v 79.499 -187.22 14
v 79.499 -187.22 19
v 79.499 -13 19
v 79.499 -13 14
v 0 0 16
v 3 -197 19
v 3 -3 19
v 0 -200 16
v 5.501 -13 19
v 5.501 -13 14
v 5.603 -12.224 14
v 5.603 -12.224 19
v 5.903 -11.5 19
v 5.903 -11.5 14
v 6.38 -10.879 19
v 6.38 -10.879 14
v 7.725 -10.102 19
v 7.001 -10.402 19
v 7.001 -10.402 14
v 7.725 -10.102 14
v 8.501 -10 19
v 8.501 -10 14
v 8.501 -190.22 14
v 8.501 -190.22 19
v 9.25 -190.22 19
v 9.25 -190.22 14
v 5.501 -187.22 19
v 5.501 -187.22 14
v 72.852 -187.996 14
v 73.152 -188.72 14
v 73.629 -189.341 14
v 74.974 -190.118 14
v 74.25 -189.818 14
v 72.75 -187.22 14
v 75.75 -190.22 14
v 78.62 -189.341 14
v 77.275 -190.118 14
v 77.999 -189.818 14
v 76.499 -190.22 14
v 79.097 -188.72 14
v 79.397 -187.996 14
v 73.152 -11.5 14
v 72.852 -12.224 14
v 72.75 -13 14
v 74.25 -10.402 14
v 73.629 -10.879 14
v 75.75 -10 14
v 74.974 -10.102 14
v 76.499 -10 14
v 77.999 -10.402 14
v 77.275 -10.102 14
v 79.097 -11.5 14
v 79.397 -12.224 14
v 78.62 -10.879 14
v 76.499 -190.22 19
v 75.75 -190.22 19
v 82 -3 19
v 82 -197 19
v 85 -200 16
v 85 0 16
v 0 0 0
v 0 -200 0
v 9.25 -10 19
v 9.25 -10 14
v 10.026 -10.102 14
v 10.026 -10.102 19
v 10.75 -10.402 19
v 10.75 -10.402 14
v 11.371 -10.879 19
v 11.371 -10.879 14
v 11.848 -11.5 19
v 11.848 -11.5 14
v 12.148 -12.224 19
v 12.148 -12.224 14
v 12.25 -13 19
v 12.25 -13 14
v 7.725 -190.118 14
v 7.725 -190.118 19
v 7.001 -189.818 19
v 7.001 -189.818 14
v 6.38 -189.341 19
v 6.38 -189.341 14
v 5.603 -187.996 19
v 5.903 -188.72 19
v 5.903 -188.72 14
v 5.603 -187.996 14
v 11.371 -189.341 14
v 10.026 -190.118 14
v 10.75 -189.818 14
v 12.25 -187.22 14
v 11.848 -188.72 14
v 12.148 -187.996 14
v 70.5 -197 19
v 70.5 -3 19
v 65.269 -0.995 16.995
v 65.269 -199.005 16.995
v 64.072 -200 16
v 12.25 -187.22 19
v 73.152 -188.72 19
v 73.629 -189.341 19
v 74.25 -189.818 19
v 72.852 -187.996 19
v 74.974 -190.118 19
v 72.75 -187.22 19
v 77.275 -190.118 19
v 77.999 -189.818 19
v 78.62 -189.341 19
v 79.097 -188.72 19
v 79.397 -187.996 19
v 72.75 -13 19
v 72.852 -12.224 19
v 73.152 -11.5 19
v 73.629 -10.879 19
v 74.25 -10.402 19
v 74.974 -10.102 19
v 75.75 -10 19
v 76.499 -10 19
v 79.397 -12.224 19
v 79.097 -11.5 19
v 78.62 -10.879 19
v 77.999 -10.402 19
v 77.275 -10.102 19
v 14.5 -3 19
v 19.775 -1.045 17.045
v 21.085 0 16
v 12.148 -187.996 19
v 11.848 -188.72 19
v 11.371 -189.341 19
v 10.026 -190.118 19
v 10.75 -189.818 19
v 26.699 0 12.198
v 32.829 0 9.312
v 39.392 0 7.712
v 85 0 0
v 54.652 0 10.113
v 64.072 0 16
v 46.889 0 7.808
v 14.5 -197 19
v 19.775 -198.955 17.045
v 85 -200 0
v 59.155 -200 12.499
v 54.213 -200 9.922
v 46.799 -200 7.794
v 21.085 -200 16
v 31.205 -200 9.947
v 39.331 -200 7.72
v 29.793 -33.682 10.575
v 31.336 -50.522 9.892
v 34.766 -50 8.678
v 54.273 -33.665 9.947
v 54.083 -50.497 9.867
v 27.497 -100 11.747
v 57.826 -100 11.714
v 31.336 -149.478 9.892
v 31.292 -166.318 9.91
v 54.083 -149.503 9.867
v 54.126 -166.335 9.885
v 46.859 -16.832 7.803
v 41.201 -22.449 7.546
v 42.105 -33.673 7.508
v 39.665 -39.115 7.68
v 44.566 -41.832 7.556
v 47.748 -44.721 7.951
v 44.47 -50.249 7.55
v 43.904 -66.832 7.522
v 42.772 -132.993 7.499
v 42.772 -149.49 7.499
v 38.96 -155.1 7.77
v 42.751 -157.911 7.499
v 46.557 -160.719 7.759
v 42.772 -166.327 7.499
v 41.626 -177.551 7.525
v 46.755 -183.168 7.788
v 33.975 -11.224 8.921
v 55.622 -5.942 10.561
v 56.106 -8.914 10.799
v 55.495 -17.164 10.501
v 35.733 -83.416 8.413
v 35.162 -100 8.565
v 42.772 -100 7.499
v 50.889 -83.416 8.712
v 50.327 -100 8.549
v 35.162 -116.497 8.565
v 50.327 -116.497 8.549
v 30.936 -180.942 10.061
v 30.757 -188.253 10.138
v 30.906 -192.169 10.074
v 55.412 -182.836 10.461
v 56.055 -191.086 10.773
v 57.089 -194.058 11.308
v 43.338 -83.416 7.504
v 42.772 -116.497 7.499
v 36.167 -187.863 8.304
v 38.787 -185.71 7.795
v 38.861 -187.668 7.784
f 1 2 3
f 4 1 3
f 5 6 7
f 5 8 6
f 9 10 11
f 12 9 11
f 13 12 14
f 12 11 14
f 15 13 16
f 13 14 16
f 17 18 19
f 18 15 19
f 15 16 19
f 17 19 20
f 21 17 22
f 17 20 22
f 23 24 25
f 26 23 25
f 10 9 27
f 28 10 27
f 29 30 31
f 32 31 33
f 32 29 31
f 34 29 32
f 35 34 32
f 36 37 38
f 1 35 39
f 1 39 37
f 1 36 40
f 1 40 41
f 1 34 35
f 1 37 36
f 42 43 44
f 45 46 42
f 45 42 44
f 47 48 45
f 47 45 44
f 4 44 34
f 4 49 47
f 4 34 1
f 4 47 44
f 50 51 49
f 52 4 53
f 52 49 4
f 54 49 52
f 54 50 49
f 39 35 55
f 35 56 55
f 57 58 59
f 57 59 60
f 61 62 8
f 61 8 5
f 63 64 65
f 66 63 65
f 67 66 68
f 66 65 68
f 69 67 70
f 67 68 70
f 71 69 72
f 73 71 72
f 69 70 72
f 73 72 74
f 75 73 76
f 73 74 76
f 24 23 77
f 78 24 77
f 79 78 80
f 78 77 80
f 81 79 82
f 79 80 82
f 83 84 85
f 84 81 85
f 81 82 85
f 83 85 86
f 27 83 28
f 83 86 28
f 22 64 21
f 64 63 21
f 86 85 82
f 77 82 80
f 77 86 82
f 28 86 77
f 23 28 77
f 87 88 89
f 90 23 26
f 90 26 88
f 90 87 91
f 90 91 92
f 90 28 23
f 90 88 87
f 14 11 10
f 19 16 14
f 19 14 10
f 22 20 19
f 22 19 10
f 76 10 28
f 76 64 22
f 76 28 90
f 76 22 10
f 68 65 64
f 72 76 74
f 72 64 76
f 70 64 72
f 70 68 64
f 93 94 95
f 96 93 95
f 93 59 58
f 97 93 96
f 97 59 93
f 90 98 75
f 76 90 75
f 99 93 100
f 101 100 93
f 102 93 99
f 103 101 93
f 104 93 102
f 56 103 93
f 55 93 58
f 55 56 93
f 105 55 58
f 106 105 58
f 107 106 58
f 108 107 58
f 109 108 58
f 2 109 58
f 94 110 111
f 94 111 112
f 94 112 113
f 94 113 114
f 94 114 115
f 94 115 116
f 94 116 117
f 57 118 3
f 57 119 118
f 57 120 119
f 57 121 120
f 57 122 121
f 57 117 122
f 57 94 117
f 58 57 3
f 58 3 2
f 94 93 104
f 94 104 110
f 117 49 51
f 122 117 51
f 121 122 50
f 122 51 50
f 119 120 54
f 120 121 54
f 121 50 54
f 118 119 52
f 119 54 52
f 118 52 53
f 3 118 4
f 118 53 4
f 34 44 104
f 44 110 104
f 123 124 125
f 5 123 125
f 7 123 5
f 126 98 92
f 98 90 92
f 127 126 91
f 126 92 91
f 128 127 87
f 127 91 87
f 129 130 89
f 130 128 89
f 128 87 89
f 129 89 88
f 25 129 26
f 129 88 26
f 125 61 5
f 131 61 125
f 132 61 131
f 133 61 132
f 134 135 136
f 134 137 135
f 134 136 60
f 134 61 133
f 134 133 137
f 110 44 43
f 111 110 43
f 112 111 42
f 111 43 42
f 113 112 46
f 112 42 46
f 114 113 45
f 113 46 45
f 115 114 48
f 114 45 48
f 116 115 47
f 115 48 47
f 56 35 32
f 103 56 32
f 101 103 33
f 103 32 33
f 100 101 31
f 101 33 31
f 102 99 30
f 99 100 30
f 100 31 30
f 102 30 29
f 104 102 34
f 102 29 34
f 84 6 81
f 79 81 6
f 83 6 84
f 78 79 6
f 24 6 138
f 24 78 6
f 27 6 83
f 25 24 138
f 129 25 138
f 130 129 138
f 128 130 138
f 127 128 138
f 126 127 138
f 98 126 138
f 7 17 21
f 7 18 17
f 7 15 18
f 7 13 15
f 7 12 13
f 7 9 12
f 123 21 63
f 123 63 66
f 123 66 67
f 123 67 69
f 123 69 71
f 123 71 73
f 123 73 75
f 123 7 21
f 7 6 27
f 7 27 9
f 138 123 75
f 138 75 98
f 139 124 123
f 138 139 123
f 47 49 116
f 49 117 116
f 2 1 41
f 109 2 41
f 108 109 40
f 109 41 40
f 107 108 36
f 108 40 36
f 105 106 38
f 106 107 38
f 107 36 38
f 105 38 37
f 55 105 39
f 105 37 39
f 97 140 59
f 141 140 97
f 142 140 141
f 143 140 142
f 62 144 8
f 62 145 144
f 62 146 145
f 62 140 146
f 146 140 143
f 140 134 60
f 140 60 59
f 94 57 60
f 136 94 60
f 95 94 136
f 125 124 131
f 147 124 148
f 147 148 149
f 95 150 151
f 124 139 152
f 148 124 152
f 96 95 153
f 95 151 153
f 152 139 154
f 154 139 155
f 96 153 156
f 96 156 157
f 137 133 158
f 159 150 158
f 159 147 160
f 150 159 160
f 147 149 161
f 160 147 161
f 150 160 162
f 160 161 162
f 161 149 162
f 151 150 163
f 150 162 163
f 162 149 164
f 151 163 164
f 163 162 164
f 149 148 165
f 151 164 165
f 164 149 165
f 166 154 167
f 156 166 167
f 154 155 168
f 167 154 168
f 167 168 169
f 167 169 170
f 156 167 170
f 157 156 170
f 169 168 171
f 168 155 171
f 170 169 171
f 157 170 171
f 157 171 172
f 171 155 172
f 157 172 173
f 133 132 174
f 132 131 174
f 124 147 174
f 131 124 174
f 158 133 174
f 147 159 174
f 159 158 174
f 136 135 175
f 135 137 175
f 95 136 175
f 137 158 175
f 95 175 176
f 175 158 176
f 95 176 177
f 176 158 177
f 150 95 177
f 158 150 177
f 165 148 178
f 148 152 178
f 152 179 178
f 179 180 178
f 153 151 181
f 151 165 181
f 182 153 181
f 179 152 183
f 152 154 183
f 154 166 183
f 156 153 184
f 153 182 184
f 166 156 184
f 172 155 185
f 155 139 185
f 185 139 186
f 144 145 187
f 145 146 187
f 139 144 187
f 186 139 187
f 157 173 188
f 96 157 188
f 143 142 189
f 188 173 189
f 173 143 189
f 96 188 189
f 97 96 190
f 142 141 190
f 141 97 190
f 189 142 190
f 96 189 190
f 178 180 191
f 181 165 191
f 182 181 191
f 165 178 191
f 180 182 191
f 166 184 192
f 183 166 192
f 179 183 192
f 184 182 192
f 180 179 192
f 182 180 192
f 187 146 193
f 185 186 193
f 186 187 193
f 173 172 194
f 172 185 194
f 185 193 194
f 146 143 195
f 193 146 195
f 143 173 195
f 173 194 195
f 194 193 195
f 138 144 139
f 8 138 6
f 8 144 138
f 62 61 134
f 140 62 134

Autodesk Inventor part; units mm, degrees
ref_plane "YZ Plane" through (0, 0, 0) normal (1, 0, 0) x (0, 1, 0)
ref_plane "XZ Plane" through (0, 0, 0) normal (0, 1, 0) x (-1, 0, 0)
ref_plane "XY Plane" through (0, 0, 0) normal (0, 0, 1) x (1, 0, 0)
sketch "Sketch2" plane through (0, 0, 0) normal (0, 0, 1) x (1, 0, 0)
  line L0 (0, 0) -> (85, 0)
  line L1 (85, 0) -> (85, -200)
  line L2 (85, -200) -> (0, -200)
  line L3 (0, -200) -> (0, 0)
  dimension "d0" = 85
  dimension "d1" = 200
extrude "Extrusion1" add sketch "Sketch2" along normal blind 19
sketch "Sketch3" plane through (10, -200, 0) normal (0, -1, 0) x (1, 0, 0)
  line L0 (75, 19) -> (-10, 19) projected
  line L1 (7.5, 19) -> (57.5, 19) construction
  spline S0 degree 1 poles (7.5, 19) (57.5, 19) knots 1 1 2 2
  spline S1 degree 2 poles (7.5, 19) (33.1045, -4.0017) (57.5, 19) knots 0 0 0 1 1 1
  line L2 (75, 0) -> (-10, 0) projected
  line L3 (0, 0) -> (0, 19) projected
  line L4 (65, 19) -> (65, 0) projected
  point P0 (33.0146, 7.5)
  dimension "d5" = 7.5
  dimension "d6" = 7.5
  dimension "d7" = 7.5
extrude "Extrusion2" cut sketch "Sketch3" against normal through all contours S1 L0
chamfer "Chamfer1" distance 3 angle 45 8 edges at (0, -100, 19) (76.25, -200, 19) (8.75, -200, 19) (67.5, -100, 19) (17.5, -100, 19) (76.25, 0, 19) (8.75, 0, 19) (85, -100, 19)
sketch "Sketch11" plane through (0, 0, 19) normal (0, 0, 1) x (1, 0, 0)
  line L0 (28.5921, -198.4024) -> (28.5921, -3.1228) construction
  line L1 (28.5921, -3.1228) -> (55.2331, -3.1228) construction
  line L2 (55.2331, -3.1228) -> (55.2331, -198.4024) construction
  line L3 (55.2331, -198.4024) -> (28.5921, -198.4024) construction
  line L4 (72.75, -190.2199) -> (79.499, -190.2199)
  line L5 (79.499, -190.2199) -> (79.499, -10)
  line L6 (79.499, -10) -> (72.75, -10)
  line L7 (72.75, -10) -> (72.75, -190.2199)
  point P0 (0, 0)
  dimension "d30" = 6.749
extrude "Extrusion5" cut sketch "Sketch11" against normal blind 5
ref_plane "Work Plane1" through (42.5, -190, 0) normal (1, 0, 0) x (0, 0, -1)
mirror "Mirror1" about plane through (42.5, -190, 0) normal (1, 0, 0) of "Extrusion5"
fillet "Fillet3" radius 3 8 edges at (5.501, -10, 16.5) (72.75, -10, 16.5) (79.499, -10, 16.5) (12.25, -10, 16.5) (72.75, -190.2199, 16.5) (5.501, -190.2199, 16.5) (79.499, -190.2199, 16.5) (12.25, -190.2199, 16.5)
properties part number "Nameplate Prototype" material "Wood (Oak)"
